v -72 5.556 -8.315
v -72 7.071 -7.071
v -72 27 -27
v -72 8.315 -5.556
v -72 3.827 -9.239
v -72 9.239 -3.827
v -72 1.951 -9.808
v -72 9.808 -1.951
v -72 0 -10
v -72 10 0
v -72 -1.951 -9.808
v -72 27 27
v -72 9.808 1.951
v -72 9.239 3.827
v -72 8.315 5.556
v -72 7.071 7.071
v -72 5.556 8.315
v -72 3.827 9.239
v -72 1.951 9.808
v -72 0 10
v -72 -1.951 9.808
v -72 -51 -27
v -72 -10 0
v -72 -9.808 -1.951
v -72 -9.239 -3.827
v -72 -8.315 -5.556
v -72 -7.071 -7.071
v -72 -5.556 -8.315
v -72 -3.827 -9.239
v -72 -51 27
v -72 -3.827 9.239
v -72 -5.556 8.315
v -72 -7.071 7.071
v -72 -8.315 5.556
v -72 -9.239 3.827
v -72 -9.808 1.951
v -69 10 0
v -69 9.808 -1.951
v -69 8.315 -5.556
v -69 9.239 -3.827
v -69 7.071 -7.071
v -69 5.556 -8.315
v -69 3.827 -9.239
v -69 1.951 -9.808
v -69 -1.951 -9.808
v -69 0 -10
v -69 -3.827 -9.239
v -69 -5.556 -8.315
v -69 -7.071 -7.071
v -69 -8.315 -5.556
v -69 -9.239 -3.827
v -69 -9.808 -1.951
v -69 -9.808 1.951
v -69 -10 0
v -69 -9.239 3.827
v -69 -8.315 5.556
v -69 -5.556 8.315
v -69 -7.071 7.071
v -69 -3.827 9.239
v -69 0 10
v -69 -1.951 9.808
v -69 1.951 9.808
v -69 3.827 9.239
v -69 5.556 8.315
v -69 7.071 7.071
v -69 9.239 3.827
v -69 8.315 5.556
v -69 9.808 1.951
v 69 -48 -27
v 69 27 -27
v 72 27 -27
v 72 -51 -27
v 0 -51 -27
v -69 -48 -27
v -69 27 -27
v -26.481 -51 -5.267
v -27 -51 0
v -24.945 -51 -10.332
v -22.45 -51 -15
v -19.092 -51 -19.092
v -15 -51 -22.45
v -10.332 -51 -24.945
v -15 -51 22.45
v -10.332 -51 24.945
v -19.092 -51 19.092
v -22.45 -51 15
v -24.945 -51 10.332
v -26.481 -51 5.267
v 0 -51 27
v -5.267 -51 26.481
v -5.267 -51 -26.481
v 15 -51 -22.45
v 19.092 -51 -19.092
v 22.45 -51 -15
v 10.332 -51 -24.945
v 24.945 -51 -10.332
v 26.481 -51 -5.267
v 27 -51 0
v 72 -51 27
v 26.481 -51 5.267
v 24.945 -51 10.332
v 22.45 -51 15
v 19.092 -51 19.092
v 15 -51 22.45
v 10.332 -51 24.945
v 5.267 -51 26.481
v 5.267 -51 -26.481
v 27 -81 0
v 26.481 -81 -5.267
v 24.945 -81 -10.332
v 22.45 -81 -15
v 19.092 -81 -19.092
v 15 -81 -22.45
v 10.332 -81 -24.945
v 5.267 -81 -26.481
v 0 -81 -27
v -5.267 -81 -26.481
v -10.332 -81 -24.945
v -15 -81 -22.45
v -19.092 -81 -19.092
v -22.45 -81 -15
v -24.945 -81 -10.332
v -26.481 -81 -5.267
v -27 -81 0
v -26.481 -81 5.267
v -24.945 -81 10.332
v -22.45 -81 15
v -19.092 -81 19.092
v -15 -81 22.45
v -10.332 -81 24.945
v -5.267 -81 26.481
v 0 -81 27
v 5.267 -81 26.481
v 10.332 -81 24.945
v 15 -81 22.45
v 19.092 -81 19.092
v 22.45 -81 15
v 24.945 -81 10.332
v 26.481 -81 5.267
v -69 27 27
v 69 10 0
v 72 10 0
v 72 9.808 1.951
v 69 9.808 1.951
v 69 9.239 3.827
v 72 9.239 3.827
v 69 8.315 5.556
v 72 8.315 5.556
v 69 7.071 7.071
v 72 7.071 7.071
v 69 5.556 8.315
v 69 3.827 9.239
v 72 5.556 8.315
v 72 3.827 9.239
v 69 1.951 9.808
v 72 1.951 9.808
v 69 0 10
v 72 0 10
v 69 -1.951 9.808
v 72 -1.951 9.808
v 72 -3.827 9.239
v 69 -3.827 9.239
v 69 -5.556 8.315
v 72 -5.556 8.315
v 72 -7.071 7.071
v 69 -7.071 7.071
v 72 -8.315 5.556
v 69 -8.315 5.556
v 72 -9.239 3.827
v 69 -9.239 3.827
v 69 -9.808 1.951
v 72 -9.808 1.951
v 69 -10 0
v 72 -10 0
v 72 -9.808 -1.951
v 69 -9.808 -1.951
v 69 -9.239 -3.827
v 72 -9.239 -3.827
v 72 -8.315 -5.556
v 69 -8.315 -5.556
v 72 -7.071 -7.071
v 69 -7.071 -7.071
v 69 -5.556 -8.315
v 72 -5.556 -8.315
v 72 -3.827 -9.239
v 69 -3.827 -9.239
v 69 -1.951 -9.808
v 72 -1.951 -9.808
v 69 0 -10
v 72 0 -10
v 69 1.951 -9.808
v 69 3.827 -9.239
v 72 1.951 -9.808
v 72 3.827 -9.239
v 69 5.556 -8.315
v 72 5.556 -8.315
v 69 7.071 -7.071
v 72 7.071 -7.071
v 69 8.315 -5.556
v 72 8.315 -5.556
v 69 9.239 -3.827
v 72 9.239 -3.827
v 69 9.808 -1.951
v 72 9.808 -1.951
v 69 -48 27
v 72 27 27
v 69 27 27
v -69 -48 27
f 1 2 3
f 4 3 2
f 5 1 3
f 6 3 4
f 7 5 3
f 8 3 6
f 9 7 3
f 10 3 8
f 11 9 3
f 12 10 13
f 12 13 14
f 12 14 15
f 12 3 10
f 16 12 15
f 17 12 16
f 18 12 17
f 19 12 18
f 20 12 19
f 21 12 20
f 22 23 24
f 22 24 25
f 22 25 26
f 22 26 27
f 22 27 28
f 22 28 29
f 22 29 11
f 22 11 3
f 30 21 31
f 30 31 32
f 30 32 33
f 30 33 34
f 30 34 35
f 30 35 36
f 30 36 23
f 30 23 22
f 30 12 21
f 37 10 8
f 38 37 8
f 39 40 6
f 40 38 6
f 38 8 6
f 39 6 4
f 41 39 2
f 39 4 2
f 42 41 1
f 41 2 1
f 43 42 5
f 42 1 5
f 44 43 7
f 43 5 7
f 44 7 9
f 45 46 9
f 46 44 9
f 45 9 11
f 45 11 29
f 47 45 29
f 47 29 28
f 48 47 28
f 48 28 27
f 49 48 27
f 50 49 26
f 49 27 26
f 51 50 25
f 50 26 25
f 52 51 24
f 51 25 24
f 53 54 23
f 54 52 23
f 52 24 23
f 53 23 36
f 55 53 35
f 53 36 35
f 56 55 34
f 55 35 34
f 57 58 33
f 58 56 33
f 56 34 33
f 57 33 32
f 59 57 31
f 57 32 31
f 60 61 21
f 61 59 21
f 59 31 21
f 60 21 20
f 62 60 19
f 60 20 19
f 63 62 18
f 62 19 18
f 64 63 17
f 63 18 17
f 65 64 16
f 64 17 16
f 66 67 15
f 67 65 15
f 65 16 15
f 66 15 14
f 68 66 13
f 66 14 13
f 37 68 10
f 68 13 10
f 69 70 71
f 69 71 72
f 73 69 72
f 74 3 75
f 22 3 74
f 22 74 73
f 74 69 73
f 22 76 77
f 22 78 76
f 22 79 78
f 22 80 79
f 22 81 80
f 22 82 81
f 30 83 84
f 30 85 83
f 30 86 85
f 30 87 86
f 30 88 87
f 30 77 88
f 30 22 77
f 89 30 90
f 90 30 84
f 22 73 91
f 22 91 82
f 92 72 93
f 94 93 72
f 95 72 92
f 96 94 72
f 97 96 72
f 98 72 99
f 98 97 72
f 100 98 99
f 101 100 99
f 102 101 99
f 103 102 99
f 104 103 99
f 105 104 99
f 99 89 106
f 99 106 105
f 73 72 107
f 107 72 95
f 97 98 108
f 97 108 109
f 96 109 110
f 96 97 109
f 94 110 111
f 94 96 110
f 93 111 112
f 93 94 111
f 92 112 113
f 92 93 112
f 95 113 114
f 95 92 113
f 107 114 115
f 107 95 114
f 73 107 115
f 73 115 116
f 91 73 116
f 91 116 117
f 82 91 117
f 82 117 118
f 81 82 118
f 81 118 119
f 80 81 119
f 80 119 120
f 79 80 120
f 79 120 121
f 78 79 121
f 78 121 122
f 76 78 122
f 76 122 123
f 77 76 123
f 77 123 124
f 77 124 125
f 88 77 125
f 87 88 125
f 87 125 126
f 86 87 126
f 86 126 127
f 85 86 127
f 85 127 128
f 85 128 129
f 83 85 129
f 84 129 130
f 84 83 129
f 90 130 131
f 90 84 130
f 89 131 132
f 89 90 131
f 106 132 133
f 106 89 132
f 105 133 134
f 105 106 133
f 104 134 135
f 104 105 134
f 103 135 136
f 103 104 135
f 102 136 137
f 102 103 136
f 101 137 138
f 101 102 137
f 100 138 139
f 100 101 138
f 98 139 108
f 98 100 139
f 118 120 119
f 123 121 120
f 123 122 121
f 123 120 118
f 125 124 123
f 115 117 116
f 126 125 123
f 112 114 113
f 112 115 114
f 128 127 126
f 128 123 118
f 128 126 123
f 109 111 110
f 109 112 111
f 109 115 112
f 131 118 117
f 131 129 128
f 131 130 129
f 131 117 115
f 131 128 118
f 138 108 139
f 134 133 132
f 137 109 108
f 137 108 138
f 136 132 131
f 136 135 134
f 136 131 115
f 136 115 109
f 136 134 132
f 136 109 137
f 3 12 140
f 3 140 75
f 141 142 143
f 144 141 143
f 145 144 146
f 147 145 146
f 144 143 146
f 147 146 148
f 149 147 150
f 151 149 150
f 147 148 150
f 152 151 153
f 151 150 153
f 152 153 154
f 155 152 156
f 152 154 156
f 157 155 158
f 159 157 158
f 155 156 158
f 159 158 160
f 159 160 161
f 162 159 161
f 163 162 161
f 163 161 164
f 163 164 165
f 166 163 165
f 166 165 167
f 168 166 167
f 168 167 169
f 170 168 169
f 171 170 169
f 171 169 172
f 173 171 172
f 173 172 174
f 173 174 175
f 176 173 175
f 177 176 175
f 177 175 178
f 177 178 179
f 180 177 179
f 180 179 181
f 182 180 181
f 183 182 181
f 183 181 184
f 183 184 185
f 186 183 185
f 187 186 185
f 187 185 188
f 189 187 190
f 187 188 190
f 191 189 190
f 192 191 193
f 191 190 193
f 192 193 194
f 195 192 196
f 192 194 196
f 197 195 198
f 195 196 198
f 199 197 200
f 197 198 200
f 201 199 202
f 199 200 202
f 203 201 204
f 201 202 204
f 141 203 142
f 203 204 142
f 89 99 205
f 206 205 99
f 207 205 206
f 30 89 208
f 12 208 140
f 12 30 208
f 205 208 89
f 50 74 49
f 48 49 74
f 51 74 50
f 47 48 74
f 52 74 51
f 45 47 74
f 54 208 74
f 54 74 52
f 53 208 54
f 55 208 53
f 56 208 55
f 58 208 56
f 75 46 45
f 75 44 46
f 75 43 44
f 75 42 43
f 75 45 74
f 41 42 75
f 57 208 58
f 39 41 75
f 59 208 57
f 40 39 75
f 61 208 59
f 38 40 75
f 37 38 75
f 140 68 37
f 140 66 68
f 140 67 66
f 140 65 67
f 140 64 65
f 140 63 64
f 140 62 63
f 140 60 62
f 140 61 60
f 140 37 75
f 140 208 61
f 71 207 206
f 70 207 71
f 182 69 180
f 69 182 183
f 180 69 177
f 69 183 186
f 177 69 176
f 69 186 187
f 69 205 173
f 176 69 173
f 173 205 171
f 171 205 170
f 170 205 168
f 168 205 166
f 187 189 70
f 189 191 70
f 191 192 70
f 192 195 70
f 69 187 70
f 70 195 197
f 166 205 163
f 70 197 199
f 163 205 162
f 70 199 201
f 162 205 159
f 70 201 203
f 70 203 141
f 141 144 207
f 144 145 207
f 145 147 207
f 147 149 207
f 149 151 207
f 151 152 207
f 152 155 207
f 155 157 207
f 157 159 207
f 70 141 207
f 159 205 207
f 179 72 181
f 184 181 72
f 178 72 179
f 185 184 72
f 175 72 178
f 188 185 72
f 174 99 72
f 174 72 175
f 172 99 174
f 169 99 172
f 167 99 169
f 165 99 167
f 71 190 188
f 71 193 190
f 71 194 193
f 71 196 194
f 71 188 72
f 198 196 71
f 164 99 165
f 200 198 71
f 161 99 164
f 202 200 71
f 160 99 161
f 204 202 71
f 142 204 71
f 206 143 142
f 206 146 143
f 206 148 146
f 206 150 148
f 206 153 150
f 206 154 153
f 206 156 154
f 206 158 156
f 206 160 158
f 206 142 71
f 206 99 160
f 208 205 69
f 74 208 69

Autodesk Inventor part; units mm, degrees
ref_plane "YZ Plane" through (0, 0, 0) normal (1, 0, 0) x (0, 1, 0)
ref_plane "XZ Plane" through (0, 0, 0) normal (0, 1, 0) x (-1, 0, 0)
ref_plane "XY Plane" through (0, 0, 0) normal (0, 0, 1) x (1, 0, 0)
sketch "Sketch1" plane through (0, 0, 0) normal (0, 0, 1) x (1, 0, 0)
  line L0 (0, 0) -> (27, 0) construction
  line L1 (27, 0) -> (27, 27)
  line L2 (27, 27) -> (0, 27)
  line L3 (0, 27) -> (0, 0) construction
  line L4 (-27, 0) -> (-27, 27)
  line L5 (-27, 27) -> (0, 27)
  line L6 (27, 0) -> (27, -27)
  line L7 (27, -27) -> (0, -27)
  line L8 (-27, -27) -> (0, -27)
  line L9 (-27, 0) -> (-27, -27)
  dimension "d0" = 27
extrude "Extrusion1" add sketch "Sketch1" along normal mid plane 138
sketch "Sketch2" plane through (0, 0, 69) normal (0, 0, 1) x (1, 0, 0)
  line L0 (27, -27) -> (27, 27) projected
  line L1 (27, 27) -> (-27, 27) projected
  line L2 (-27, 27) -> (-27, -27) projected
  line L3 (-27, -27) -> (27, -27) projected
  circle A0 centre (0, 0) radius 27
extrude "Extrusion2" cut sketch "Sketch2" against normal blind 30 contours L3 A0 L0 | A0 L1 L0 | L3 L2 A0 | A0 L2 L1
sketch "Sketch3" plane through (0, 0, 69) normal (0, 0, 1) x (1, 0, 0)
  circle A0 centre (0, 0) radius 27 projected
  line L0 (-51, 27) -> (27, 27)
  line L1 (27, 27) -> (27, -27)
  line L2 (27, -27) -> (-51, -27)
  line L3 (-51, -27) -> (-51, 27)
  line L4 (27, 27) -> (27, 0) projected
  line L5 (27, 27) -> (27, -27) projected
  line L6 (0, 27) -> (27, 27) projected
  line L7 (27, -27) -> (0, -27) projected
  dimension "d6" = 51
extrude "Extrusion3" add sketch "Sketch3" along normal blind 3
sketch "Sketch4" plane through (0, 0, 72) normal (0, 0, 1) x (1, 0, 0)
  circle A0 centre (0, 0) radius 10
  dimension "d9" = 20
extrude "Extrusion4" cut sketch "Sketch4" against normal blind 3
mirror "Mirror1" about plane through (0, 0, 0) normal (0, 0, 1) of "Extrusion3", "Extrusion4"
sketch "Sketch5" plane through (-51, 27, -69) normal (0, 0, 1) x (1, 0, 0)
  line L0 (24, -54) -> (0, -54) projected
  line L1 (0, 0) -> (3, 0)
  line L2 (3, 0) -> (3, -54)
  line L3 (3, -54) -> (0, -54)
  line L4 (0, -54) -> (0, 0)
  point P0 (51, -27)
  dimension "d13" = 3
extrude "Extrusion5" add sketch "Sketch5" along normal up to next
sketch "Sketch6" plane through (-51, -27, 72) normal (-1, 0, 0) x (0, 0, 1)
  line L0 (0, 0) -> (-144, 0) projected
  circle A0 centre (-72, 27) radius 27
extrude "Extrusion6" add sketch "Sketch6" along normal blind 30
sketch "Sketch7" plane through (-27, 27, 39) normal (0, 1, 0) x (1, 0, 0)
  line L0 (0, 108) -> (54, 108)
  line L1 (54, 108) -> (54, -30)
  line L2 (54, -30) -> (0, -30)
  line L3 (0, -30) -> (0, 108)
  point P0 (27, 39)
extrude "Extrusion7" cut sketch "Sketch7" against normal through all
move or copy body "Move Body1" bodies to move or copy 1 copy no rotation origin (0, 0, 0) rotation axis (1, 0, 0) rotation angle 90
move or copy body "Move Body2" bodies to move or copy 1 copy no rotation origin (0, 0, 0) rotation axis (0, 0, 1) rotation angle 90
properties part number "Sholder_Pitch"
